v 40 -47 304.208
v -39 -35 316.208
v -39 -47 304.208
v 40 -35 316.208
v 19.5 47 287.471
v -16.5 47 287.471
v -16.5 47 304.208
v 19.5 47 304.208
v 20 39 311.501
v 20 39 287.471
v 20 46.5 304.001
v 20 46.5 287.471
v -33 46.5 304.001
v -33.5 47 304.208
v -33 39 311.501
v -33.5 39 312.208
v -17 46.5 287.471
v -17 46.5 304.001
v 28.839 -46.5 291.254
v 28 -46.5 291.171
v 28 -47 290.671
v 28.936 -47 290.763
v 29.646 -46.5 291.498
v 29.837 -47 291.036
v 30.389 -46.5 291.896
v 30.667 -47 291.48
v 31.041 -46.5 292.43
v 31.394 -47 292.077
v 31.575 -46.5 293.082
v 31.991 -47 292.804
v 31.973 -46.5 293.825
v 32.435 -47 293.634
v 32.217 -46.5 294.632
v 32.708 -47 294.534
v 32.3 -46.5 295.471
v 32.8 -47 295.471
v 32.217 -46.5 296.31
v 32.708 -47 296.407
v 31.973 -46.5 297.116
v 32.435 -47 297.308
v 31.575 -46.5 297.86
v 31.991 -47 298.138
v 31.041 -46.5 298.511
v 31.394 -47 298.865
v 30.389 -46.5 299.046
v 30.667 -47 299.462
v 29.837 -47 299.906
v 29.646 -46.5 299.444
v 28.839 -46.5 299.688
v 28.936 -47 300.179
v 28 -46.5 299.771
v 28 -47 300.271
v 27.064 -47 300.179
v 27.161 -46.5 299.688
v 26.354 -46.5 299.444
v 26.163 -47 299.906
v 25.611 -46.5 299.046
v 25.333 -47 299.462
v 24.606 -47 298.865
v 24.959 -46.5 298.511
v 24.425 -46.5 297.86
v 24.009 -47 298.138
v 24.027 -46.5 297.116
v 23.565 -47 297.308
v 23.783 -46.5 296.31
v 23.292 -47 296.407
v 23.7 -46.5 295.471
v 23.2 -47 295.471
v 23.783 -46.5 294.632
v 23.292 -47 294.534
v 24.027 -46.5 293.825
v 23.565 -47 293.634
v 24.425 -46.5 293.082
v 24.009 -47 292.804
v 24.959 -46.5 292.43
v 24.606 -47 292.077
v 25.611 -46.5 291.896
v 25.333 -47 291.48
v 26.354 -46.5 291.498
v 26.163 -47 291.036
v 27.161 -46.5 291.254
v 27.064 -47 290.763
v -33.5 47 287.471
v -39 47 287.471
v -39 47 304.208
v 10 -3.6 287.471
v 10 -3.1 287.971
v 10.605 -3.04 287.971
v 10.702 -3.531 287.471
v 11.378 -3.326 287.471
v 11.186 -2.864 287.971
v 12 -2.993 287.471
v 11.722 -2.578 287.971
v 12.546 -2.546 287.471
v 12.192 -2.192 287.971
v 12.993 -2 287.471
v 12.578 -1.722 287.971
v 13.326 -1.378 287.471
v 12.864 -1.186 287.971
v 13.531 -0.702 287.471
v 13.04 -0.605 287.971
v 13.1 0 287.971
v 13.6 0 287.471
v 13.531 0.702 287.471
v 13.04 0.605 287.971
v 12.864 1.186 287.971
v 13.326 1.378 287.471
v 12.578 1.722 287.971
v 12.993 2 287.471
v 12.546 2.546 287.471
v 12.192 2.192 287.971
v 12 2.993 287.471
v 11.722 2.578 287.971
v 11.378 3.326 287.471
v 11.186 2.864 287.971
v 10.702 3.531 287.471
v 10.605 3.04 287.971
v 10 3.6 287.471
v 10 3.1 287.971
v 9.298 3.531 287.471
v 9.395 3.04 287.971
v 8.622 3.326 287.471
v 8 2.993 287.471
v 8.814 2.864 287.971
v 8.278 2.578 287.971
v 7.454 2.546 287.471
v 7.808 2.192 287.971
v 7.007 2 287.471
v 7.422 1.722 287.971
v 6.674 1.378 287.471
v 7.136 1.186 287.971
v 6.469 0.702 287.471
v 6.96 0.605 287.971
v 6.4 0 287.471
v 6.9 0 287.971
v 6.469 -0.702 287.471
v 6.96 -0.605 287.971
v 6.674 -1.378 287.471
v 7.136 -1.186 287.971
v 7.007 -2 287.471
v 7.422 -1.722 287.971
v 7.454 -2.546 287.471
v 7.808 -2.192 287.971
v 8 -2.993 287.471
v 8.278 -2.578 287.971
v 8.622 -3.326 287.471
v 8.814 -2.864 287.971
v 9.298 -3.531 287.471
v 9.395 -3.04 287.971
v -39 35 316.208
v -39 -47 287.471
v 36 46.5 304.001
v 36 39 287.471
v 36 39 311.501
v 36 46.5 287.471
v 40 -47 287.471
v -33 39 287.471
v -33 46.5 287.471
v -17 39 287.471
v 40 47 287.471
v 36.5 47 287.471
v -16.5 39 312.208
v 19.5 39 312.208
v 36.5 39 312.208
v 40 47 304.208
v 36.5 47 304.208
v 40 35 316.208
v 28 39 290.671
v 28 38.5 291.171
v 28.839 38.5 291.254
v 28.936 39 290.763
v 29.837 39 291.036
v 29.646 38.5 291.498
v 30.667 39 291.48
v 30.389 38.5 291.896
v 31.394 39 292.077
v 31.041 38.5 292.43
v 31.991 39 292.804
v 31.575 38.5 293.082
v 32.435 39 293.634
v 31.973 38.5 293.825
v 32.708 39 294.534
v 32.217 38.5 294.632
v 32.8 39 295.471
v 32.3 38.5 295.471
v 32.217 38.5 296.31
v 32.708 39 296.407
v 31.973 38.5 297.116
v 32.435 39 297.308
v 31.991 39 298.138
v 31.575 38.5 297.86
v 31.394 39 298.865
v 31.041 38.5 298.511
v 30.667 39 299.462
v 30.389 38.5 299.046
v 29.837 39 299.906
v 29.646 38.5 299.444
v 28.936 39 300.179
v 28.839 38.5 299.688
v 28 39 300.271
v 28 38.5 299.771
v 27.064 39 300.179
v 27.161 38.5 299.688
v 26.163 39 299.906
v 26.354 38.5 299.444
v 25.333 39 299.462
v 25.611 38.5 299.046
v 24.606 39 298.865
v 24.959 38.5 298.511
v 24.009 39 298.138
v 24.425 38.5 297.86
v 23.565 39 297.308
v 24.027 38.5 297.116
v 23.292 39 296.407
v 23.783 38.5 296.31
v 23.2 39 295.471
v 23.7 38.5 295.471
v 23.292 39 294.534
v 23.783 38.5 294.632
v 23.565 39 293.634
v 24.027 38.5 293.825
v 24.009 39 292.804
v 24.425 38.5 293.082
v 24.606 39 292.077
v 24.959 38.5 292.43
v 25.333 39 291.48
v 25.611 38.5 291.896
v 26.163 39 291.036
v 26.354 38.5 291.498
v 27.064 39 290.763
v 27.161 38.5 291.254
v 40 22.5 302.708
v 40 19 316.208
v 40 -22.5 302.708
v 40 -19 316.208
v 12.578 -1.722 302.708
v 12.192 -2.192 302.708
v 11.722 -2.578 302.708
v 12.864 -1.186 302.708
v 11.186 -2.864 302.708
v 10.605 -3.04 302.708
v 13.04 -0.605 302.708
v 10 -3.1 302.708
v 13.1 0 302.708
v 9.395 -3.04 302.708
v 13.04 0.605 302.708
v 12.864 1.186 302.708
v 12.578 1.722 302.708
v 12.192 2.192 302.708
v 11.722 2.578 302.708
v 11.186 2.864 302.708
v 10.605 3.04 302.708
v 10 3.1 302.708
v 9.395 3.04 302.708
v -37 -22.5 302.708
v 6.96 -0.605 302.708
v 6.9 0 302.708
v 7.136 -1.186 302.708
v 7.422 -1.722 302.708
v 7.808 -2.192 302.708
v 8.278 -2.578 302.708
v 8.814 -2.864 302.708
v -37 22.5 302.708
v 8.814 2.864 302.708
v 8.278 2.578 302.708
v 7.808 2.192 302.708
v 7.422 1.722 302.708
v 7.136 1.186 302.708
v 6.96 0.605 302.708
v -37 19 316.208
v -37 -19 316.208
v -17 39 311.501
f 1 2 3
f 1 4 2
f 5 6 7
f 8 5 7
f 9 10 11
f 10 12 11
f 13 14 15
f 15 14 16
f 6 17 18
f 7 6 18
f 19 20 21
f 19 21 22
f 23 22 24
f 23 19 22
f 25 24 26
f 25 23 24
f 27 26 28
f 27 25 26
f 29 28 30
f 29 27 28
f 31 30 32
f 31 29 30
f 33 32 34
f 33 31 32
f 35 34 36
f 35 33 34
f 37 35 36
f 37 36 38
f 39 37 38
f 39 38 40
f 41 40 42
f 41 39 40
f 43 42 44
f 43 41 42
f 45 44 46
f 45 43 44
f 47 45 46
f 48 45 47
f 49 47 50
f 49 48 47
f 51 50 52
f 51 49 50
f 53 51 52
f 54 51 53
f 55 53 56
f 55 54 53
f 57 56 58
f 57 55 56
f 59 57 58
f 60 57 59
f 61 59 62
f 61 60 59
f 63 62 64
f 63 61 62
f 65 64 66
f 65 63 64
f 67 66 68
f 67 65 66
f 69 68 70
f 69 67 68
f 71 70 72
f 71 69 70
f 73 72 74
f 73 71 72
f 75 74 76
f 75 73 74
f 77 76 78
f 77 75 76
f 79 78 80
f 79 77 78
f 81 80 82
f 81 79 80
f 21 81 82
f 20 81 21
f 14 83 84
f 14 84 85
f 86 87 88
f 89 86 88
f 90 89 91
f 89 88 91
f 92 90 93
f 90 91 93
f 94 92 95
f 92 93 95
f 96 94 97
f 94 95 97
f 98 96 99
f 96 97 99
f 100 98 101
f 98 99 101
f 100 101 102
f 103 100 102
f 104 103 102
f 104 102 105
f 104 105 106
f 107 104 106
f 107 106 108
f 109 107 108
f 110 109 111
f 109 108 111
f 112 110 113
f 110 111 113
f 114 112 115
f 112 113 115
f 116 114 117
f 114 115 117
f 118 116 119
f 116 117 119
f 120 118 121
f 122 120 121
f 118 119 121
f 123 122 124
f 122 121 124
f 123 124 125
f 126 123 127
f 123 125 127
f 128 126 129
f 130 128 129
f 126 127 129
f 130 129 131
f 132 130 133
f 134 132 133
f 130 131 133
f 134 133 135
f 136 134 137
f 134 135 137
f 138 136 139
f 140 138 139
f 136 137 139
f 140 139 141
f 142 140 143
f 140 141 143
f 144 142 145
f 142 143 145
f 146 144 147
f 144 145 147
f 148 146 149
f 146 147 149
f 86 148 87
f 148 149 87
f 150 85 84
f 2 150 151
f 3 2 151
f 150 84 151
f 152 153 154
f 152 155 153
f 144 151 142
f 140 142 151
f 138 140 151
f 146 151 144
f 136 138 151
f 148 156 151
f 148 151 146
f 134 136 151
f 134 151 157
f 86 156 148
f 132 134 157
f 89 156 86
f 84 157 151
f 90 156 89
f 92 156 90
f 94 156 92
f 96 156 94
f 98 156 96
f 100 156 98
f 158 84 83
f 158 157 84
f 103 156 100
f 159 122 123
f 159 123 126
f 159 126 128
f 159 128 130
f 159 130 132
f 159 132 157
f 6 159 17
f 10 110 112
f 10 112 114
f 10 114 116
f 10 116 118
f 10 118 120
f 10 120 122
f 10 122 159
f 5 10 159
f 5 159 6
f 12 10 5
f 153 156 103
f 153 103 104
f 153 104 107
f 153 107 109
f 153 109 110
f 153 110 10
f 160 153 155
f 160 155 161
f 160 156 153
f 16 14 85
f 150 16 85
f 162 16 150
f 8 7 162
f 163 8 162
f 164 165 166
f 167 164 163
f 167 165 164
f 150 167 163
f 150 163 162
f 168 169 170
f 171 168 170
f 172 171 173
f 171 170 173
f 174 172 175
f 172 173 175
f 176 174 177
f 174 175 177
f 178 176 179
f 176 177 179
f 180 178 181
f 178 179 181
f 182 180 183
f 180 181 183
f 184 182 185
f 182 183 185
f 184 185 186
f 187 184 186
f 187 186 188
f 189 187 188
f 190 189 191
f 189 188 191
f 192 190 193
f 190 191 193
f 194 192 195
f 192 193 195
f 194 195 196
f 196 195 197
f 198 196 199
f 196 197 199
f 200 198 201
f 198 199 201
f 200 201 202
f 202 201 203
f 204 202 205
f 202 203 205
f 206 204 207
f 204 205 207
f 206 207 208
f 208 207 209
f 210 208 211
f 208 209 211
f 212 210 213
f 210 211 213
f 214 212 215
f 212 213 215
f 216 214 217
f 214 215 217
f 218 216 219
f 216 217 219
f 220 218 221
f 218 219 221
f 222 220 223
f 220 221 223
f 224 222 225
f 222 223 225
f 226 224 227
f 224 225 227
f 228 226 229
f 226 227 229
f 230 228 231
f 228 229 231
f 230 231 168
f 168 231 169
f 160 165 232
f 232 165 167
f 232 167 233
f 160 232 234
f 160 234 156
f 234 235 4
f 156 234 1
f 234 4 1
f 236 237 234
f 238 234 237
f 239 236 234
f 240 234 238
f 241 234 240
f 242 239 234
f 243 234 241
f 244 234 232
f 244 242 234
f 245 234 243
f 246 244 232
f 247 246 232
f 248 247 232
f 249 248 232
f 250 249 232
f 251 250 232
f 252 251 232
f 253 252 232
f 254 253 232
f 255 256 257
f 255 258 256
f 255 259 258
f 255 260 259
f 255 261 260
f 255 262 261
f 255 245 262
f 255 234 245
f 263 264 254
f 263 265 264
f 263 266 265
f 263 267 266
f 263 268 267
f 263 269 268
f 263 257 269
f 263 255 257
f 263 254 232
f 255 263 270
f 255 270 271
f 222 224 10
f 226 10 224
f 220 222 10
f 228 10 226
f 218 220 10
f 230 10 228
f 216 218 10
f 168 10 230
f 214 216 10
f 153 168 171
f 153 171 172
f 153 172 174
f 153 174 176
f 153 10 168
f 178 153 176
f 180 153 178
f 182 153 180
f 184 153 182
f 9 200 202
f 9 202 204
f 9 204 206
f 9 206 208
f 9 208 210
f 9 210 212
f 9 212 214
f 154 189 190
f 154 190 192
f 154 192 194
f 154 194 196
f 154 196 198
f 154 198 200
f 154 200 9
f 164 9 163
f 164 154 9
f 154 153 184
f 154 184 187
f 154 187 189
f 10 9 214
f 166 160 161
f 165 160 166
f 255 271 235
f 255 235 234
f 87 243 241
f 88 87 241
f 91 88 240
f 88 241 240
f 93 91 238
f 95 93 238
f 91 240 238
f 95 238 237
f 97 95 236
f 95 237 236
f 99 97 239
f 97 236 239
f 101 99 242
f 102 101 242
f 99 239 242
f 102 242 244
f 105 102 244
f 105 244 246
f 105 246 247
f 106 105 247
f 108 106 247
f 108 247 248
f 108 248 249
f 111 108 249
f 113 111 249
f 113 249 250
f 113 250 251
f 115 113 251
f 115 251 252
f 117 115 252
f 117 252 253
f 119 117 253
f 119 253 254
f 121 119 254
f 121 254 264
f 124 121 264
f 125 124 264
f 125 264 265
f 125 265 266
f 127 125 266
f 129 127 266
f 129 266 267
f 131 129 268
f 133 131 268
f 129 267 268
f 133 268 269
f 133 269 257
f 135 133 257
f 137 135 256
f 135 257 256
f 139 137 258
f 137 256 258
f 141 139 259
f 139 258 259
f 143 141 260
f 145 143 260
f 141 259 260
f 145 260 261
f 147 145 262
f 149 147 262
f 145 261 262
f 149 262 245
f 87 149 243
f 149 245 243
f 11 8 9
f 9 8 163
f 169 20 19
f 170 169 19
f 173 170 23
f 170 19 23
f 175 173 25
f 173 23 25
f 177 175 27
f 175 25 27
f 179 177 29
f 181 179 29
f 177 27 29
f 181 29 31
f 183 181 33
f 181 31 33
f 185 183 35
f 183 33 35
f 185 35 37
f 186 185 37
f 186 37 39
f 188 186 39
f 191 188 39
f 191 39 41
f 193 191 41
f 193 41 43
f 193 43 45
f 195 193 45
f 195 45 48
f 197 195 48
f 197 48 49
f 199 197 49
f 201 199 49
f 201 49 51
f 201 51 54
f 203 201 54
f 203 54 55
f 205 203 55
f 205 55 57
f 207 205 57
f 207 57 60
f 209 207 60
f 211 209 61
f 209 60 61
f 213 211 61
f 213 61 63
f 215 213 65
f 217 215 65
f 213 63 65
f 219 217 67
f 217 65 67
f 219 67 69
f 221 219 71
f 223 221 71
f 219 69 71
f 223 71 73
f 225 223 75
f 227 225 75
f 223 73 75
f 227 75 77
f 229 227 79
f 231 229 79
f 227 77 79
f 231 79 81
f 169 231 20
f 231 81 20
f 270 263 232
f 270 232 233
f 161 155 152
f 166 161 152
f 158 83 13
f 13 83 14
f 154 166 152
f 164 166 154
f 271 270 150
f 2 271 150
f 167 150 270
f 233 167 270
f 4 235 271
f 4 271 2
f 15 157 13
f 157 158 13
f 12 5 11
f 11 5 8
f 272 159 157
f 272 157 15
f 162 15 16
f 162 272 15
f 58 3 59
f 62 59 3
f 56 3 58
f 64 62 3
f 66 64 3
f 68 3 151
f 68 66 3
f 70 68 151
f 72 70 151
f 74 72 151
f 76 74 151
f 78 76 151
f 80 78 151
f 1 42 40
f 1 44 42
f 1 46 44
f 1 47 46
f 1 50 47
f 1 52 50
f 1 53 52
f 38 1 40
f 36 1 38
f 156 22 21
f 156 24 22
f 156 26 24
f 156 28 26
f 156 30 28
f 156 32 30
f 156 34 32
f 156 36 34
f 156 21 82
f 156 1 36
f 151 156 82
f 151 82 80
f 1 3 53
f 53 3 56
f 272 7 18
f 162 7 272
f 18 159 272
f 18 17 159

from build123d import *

# Parameters (mm, degrees)
PAD035_DEPTH    = 77
SKETCH115_R     = 3.1
POCKET071_DEPTH = 30
SKETCH116_R     = 4.3
POCKET072_DEPTH = 100
CHAMFER014_SIZE = 12
PAD036_DEPTH    = 2
SKETCH118_W     = 30
SKETCH118_H     = 16
POCKET073_DEPTH = 8
CHAMFER023_SIZE = 0.5


with BuildPart() as part:
    # Sketch114 → Pad035 (new body)
    with BuildSketch(Plane.YZ):
        Polygon((-47, 203.208383528), (-19, 203.208383528), (-22.5, 189.708383528), (22.5, 189.708383528), (19, 203.208383528), (47, 203.208383528), (47, 174.470931), (-47, 174.470931), align=None)
    extrude(amount=PAD035_DEPTH)

    # Sketch115 (on Face3 of Pad035) → Pocket071 (cut)
    with BuildSketch(Plane(origin=(0, 0, 189.708383528), x_dir=(0, -1, 0), z_dir=(0, 0, 1))):
        with Locations((0, 47)):
            Circle(SKETCH115_R)
    extrude(amount=-POCKET071_DEPTH, mode=Mode.SUBTRACT)

    # Sketch116 (on Face2 of Pocket071) → Pocket072 (cut)
    with BuildSketch(Plane(origin=(0, -47, 0), x_dir=(0, 0, -1), z_dir=(0, -1, 0))):
        with Locations((-182.470931, 65)):
            Circle(SKETCH116_R)
    extrude(amount=-POCKET072_DEPTH, mode=Mode.SUBTRACT)

    # Chamfer014
    chamfer014_edges = [part.edges().sort_by_distance(p)[0] for p in [
        (38.5, 47, 203.208384),
        (38.5, -47, 203.208384),
    ]]
    chamfer(chamfer014_edges, length=CHAMFER014_SIZE)

    # Sketch117 (on Face2 of Chamfer014) → Pad036 (join)
    with BuildSketch(Plane(origin=(0, 0, 0), x_dir=(0, 1, 0), z_dir=(-1, 0, 0))):
        Polygon((-47, -174.470931), (47, -174.470931), (47, -191.208383528), (35, -203.208383528), (-35, -203.208383528), (-47, -191.208383528), align=None)
    extrude(amount=PAD036_DEPTH)

    # Sketch118 (on Face15 of Pad036) → Pocket073 (cut)
    with BuildSketch(Plane.ZX.offset(47)):
        with Locations((189.470931, 65)):
            Rectangle(SKETCH118_W, SKETCH118_H)
        with Locations((189.470931, 12)):
            Rectangle(SKETCH118_W, SKETCH118_H)
    extrude(amount=-POCKET073_DEPTH, mode=Mode.SUBTRACT)

    # Chamfer023
    chamfer023_edges = [part.edges().sort_by_distance(p)[0] for p in [
        (73, 43, 195.208384),
        (57, 43, 195.208384),
        (57, 47, 182.839657),
        (73, 47, 182.839657),
        (20, 43, 195.208384),
        (4, 43, 195.208384),
        (4, 47, 182.839657),
        (20, 47, 182.839657),
        (47, 3.1, 174.470931),
        (65, 39, 186.770931),
        (65, -47, 186.770931),
    ]]
    chamfer(chamfer023_edges, length=CHAMFER023_SIZE)


with BuildPart() as part_1:
    # Body027 placement: moved
    add(part.part.moved(Location((-37, 0, 113))))


solid = part_1.part
